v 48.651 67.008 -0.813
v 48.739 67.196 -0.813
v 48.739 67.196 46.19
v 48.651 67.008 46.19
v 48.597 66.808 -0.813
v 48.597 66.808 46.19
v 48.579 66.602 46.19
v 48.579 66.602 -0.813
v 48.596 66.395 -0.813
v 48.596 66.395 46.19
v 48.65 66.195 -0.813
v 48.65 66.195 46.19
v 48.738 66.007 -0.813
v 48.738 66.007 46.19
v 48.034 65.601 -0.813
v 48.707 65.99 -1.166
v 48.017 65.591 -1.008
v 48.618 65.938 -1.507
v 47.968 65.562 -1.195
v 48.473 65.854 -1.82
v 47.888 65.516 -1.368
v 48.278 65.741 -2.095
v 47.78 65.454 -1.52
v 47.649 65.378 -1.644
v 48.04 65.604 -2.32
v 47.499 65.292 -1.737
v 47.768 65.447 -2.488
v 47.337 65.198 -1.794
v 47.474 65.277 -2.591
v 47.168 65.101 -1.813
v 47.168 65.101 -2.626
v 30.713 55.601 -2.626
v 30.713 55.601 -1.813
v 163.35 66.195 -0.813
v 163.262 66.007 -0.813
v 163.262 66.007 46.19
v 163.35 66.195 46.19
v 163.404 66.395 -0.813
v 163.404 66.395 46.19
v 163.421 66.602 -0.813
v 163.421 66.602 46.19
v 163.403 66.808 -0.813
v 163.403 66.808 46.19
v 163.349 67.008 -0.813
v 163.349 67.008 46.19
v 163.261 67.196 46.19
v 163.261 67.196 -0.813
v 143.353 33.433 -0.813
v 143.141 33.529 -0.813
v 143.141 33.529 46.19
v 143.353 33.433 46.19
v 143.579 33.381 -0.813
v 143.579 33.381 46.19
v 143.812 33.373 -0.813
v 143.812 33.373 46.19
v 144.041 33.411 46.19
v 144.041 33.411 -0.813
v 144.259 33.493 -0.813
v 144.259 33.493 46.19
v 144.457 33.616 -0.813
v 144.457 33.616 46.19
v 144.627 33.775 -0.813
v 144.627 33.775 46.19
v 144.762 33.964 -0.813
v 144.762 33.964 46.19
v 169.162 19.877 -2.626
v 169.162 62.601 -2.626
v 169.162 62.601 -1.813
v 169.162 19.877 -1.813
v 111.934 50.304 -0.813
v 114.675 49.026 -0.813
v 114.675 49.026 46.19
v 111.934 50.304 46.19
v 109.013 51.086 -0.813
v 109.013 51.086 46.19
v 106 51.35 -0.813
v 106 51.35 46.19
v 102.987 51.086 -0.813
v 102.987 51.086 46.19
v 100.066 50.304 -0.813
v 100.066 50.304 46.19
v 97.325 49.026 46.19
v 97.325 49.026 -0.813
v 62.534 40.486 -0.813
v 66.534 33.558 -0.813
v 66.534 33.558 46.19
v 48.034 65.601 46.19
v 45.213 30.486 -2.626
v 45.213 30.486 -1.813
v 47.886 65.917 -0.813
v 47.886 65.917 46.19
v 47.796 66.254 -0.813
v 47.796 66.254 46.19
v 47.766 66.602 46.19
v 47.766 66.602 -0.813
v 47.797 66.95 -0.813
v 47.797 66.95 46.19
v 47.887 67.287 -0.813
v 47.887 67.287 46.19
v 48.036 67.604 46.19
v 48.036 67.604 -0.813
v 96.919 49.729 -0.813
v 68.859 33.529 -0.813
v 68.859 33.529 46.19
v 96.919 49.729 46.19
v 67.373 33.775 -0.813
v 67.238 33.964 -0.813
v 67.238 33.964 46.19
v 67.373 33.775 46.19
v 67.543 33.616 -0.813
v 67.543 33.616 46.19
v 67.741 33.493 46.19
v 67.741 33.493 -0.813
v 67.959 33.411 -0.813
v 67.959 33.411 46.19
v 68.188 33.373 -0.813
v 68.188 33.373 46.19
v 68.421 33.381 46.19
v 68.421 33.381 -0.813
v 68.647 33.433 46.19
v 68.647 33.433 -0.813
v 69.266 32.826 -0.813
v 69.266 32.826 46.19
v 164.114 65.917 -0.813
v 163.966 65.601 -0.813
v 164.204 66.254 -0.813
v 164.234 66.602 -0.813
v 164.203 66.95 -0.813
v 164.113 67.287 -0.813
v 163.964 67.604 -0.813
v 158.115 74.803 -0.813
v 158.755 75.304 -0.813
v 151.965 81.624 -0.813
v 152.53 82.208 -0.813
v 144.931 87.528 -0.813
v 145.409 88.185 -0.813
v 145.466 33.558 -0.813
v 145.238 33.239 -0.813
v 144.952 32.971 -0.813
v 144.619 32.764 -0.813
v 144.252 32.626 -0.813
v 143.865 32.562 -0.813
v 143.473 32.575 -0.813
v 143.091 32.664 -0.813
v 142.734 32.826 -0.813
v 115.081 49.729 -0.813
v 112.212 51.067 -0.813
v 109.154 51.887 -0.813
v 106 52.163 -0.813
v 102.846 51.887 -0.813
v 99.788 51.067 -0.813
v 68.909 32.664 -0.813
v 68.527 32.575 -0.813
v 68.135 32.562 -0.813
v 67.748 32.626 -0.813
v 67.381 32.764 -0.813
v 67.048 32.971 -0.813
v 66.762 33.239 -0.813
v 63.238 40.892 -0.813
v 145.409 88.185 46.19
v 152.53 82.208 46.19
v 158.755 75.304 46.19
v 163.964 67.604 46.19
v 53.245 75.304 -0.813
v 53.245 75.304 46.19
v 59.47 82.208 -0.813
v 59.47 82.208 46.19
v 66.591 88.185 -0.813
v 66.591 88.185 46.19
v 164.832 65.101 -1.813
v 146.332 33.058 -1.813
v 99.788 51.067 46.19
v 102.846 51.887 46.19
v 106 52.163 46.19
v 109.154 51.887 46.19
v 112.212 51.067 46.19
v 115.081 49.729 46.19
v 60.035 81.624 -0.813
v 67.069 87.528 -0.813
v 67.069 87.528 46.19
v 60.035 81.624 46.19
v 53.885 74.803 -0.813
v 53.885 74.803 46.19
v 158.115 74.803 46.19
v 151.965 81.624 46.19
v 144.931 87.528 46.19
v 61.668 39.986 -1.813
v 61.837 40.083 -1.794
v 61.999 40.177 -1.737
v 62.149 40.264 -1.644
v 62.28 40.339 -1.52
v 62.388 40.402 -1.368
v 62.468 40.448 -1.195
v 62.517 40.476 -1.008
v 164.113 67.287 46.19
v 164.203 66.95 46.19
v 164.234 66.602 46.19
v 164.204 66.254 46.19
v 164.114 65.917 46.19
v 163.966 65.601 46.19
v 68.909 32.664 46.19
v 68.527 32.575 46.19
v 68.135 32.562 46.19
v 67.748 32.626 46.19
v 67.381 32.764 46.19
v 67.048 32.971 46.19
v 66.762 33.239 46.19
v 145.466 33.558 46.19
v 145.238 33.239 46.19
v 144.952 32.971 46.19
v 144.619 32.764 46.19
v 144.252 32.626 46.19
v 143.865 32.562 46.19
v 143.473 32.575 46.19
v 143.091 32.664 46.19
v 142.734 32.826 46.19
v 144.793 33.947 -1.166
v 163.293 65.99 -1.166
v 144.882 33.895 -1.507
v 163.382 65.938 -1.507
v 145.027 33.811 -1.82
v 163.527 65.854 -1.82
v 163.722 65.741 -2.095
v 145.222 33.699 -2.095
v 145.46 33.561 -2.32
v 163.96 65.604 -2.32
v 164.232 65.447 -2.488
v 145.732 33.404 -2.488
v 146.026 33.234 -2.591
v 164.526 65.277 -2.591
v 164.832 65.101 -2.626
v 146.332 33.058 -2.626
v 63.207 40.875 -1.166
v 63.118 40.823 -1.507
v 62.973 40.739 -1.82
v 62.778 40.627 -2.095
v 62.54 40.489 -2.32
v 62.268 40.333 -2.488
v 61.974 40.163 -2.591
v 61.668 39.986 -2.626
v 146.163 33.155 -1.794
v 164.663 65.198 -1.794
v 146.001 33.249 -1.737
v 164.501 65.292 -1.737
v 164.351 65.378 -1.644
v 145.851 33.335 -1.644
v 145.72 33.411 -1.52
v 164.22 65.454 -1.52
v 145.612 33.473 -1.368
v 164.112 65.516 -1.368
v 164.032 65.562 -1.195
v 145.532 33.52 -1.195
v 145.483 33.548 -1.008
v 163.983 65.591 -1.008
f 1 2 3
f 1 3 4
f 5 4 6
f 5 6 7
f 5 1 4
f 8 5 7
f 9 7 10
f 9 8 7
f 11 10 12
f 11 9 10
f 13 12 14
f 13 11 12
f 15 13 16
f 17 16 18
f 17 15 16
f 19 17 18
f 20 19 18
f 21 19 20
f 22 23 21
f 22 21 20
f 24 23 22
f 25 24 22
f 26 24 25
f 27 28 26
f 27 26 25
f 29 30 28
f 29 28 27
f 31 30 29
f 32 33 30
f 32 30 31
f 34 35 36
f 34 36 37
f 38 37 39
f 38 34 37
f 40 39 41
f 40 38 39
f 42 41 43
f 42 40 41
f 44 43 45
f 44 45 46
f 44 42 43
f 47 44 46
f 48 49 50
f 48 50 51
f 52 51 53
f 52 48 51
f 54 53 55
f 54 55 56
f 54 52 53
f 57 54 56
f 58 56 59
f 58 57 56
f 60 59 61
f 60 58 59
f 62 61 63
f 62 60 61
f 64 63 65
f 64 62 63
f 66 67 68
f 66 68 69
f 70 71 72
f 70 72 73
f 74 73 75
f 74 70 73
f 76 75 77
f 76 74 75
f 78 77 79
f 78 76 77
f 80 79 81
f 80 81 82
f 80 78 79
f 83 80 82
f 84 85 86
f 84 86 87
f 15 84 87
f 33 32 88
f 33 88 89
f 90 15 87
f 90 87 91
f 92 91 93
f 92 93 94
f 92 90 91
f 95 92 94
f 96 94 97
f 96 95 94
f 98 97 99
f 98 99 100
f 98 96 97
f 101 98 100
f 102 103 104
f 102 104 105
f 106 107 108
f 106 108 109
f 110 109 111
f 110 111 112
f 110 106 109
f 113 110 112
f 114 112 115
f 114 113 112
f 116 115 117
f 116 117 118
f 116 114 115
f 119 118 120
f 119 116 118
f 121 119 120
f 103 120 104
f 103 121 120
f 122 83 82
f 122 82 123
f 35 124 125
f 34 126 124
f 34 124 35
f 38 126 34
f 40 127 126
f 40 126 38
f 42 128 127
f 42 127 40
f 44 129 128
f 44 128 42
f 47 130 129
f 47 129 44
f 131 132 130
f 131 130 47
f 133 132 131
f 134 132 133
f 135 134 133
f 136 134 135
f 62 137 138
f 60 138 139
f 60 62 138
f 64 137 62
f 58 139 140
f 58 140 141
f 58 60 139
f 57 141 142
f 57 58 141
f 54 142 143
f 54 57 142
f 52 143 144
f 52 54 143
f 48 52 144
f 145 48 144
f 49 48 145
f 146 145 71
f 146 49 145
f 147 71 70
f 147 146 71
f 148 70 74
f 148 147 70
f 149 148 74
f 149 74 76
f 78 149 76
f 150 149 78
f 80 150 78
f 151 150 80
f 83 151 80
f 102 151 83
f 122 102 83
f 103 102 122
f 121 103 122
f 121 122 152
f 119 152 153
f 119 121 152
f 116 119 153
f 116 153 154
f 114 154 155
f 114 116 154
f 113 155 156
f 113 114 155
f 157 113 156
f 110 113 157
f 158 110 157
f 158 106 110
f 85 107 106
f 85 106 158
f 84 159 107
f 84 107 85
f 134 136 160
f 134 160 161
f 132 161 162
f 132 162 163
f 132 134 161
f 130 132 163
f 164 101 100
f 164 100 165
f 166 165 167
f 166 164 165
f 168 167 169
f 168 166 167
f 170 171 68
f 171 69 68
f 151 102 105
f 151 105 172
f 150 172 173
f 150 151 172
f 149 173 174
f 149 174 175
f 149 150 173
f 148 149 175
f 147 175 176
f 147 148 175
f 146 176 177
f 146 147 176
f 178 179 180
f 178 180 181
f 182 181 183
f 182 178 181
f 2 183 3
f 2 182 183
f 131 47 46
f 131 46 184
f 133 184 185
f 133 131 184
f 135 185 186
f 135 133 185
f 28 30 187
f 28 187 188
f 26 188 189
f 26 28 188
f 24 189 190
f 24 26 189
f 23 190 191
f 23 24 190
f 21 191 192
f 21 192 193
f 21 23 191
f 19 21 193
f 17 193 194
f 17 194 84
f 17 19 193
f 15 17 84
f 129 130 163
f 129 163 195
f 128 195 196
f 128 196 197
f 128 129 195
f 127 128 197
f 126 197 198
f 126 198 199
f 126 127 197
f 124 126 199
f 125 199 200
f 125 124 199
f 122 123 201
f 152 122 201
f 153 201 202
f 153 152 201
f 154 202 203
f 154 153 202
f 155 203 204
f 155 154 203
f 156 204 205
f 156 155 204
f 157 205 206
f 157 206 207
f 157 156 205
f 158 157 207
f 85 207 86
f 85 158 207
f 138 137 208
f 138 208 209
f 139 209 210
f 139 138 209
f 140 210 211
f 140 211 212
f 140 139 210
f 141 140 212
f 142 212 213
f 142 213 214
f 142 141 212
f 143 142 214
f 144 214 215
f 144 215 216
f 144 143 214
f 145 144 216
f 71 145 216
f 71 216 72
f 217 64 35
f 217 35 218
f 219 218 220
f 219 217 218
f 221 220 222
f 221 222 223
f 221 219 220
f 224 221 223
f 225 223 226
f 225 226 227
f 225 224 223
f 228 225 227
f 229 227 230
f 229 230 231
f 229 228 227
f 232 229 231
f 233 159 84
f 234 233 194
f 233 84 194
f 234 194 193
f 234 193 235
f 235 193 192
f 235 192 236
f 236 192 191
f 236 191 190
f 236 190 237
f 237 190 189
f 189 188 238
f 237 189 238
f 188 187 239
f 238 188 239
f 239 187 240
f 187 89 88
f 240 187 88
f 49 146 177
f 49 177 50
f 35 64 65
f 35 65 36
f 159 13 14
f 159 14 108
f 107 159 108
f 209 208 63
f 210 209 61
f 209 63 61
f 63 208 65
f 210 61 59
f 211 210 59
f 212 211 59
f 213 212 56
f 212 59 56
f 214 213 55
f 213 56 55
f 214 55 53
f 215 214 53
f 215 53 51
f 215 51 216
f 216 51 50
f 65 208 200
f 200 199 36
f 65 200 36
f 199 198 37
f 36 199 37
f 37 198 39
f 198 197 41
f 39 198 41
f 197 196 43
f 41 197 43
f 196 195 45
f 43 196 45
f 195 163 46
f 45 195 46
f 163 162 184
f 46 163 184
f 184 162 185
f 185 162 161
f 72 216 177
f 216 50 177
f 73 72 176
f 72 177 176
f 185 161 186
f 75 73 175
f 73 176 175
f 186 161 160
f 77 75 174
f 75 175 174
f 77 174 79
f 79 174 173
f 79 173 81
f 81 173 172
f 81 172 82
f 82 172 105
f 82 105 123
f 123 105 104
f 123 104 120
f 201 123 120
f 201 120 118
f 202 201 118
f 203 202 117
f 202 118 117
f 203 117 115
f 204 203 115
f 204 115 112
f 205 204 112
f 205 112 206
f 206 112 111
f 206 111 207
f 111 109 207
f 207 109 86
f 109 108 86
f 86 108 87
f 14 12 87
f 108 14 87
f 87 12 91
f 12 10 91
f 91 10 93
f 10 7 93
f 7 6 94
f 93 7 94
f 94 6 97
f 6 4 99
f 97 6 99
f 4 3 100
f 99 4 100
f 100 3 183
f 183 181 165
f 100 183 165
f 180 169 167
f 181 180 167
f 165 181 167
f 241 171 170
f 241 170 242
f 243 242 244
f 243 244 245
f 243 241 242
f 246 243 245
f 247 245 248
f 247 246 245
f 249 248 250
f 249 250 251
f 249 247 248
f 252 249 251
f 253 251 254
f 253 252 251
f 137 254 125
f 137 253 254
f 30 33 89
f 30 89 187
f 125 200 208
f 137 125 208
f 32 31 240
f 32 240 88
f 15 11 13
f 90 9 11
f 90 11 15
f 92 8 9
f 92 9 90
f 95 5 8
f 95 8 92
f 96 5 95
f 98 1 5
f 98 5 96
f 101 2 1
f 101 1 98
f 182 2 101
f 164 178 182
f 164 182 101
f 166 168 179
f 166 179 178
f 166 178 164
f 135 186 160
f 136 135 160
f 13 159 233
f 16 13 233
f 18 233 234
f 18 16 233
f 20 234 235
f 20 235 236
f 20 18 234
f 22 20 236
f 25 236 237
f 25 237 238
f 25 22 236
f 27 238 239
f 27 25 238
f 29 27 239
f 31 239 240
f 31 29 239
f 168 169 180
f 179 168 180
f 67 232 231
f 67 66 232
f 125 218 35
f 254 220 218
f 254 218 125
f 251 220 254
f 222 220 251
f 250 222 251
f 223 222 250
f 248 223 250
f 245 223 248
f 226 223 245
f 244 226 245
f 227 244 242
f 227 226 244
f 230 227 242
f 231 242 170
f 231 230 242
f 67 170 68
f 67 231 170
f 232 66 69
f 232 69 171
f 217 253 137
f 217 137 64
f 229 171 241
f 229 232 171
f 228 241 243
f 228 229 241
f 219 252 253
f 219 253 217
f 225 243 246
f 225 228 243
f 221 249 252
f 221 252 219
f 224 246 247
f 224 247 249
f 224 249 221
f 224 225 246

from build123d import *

# Parameters (mm, degrees)
BASE_FLANGE1_DEPTH      = 46.19
BASE_FLANGE1_DEPTH_BACK = 0.8128
EDGE_FLANGE1_DEPTH      = 29
EDGE_FLANGE1_BEND_DEPTH = 37
EDGE_FLANGE1_START      = 0.8128
EDGE_FLANGE1_FLAT_DEPTH = 0.8128


# Sheet-metal steps are written as plain solids
with BuildPart() as part:
    # Sketch1 → Base-Flange1 (new, two sides: drawn at the far end of the back side and taken through both)
    with BuildSketch(Plane.XY.offset(-BASE_FLANGE1_DEPTH_BACK)):
        with BuildLine():
            ThreePointArc((145.409019443, 88.185), (155.762419921, 78.86409034), (163.964489977, 67.603614987))
            ThreePointArc((163.964489977, 67.603614987), (164.234222289, 66.60231267), (163.96627389, 65.600531503))
            Line((163.96627389, 65.600531503), (145.46627389, 33.557591563))
            ThreePointArc((145.46627389, 33.557591563), (144.251861173, 32.625739911), (142.734223083, 32.825540756))
            Line((142.734223083, 32.825540756), (114.675, 49.025540756))
            ThreePointArc((114.675, 49.025540756), (106, 51.35), (97.325, 49.025540756))
            Line((97.325, 49.025540756), (69.265776917, 32.825540756))
            ThreePointArc((69.265776917, 32.825540756), (67.748138827, 32.625739911), (66.53372611, 33.557591563))
            Line((66.53372611, 33.557591563), (48.03372611, 65.600531503))
            ThreePointArc((48.03372611, 65.600531503), (47.76577771, 66.60231267), (48.035510023, 67.603614987))
            ThreePointArc((48.035510023, 67.603614987), (56.237580079, 78.86409034), (66.590980557, 88.185))
            Line((66.590980557, 88.185), (67.069060372, 87.52766939))
            ThreePointArc((67.069060372, 87.52766939), (56.841259359, 78.319833814), (48.738690489, 67.195961859))
            ThreePointArc((48.738690489, 67.195961859), (48.578577388, 66.601588804), (48.737631558, 66.006931503))
            Line((48.737631558, 66.006931503), (67.237631558, 33.963991563))
            ThreePointArc((67.237631558, 33.963991563), (67.958506947, 33.410844422), (68.859376917, 33.529446204))
            Line((68.859376917, 33.529446204), (96.9186, 49.729446204))
            ThreePointArc((96.9186, 49.729446204), (106, 52.1628), (115.0814, 49.729446204))
            Line((115.0814, 49.729446204), (143.140623083, 33.529446204))
            ThreePointArc((143.140623083, 33.529446204), (144.041493053, 33.410844422), (144.762368442, 33.963991563))
            Line((144.762368442, 33.963991563), (163.262368442, 66.006931503))
            ThreePointArc((163.262368442, 66.006931503), (163.421422612, 66.601588804), (163.261309511, 67.195961859))
            ThreePointArc((163.261309511, 67.195961859), (155.158740641, 78.319833814), (144.930939628, 87.52766939))
            Line((144.930939628, 87.52766939), (145.409019443, 88.185))
        make_face()
    extrude(amount=BASE_FLANGE1_DEPTH + BASE_FLANGE1_DEPTH_BACK)

    # Edge-Flange1 section (across the edge) → Edge-Flange1 (add)
    with BuildSketch(Plane(origin=(48.03372611, 65.600531503, -1.8128), x_dir=(0, 0, 1), z_dir=(0.5000000000000168, -0.866025403784429, 0))):
        with BuildLine():
            Line((-0.8128, 1), (-0.8128, 20))
            Line((-0.8128, 20), (0, 20))
            Line((0, 20), (0, 1))
            ThreePointArc((0, 1), (0.292893219, 0.292893219), (1, 0))
            Line((1, 0), (1, -0.8128))
            ThreePointArc((1, -0.8128), (-0.281843173, -0.281843173), (-0.8128, 1))
        make_face()
    extrude(amount=EDGE_FLANGE1_DEPTH)

    # Edge-Flange1 bend section (across the edge) → Edge-Flange1 bend (add)
    with BuildSketch(Plane(origin=(145.46627389, 33.557591563, -1.8128), x_dir=(0, 0, 1), z_dir=(0.4999999999999994, 0.866025403784439, 0))):
        with BuildLine():
            Line((-0.8128, 1), (0, 1))
            ThreePointArc((0, 1), (0.292893219, 0.292893219), (1, 0))
            Line((1, 0), (1, -0.8128))
            ThreePointArc((1, -0.8128), (-0.281843173, -0.281843173), (-0.8128, 1))
        make_face()
    extrude(amount=EDGE_FLANGE1_BEND_DEPTH)

    # Edge-Flange1 profile (on flange) → Edge-Flange1 flat (add)
    with BuildSketch(Plane(origin=(94.568842026, -54.599346401, -1.8128), x_dir=(0.4999999999999994, 0.866025403784439, 0), z_dir=(0, 0, -1)).offset(EDGE_FLANGE1_START)):
        Polygon((101.794863729, 1), (138.794863729, 1), (138.794863729, 6), (101.794863729, 27.36195996), align=None)
    extrude(amount=-EDGE_FLANGE1_FLAT_DEPTH)


solid = part.part
